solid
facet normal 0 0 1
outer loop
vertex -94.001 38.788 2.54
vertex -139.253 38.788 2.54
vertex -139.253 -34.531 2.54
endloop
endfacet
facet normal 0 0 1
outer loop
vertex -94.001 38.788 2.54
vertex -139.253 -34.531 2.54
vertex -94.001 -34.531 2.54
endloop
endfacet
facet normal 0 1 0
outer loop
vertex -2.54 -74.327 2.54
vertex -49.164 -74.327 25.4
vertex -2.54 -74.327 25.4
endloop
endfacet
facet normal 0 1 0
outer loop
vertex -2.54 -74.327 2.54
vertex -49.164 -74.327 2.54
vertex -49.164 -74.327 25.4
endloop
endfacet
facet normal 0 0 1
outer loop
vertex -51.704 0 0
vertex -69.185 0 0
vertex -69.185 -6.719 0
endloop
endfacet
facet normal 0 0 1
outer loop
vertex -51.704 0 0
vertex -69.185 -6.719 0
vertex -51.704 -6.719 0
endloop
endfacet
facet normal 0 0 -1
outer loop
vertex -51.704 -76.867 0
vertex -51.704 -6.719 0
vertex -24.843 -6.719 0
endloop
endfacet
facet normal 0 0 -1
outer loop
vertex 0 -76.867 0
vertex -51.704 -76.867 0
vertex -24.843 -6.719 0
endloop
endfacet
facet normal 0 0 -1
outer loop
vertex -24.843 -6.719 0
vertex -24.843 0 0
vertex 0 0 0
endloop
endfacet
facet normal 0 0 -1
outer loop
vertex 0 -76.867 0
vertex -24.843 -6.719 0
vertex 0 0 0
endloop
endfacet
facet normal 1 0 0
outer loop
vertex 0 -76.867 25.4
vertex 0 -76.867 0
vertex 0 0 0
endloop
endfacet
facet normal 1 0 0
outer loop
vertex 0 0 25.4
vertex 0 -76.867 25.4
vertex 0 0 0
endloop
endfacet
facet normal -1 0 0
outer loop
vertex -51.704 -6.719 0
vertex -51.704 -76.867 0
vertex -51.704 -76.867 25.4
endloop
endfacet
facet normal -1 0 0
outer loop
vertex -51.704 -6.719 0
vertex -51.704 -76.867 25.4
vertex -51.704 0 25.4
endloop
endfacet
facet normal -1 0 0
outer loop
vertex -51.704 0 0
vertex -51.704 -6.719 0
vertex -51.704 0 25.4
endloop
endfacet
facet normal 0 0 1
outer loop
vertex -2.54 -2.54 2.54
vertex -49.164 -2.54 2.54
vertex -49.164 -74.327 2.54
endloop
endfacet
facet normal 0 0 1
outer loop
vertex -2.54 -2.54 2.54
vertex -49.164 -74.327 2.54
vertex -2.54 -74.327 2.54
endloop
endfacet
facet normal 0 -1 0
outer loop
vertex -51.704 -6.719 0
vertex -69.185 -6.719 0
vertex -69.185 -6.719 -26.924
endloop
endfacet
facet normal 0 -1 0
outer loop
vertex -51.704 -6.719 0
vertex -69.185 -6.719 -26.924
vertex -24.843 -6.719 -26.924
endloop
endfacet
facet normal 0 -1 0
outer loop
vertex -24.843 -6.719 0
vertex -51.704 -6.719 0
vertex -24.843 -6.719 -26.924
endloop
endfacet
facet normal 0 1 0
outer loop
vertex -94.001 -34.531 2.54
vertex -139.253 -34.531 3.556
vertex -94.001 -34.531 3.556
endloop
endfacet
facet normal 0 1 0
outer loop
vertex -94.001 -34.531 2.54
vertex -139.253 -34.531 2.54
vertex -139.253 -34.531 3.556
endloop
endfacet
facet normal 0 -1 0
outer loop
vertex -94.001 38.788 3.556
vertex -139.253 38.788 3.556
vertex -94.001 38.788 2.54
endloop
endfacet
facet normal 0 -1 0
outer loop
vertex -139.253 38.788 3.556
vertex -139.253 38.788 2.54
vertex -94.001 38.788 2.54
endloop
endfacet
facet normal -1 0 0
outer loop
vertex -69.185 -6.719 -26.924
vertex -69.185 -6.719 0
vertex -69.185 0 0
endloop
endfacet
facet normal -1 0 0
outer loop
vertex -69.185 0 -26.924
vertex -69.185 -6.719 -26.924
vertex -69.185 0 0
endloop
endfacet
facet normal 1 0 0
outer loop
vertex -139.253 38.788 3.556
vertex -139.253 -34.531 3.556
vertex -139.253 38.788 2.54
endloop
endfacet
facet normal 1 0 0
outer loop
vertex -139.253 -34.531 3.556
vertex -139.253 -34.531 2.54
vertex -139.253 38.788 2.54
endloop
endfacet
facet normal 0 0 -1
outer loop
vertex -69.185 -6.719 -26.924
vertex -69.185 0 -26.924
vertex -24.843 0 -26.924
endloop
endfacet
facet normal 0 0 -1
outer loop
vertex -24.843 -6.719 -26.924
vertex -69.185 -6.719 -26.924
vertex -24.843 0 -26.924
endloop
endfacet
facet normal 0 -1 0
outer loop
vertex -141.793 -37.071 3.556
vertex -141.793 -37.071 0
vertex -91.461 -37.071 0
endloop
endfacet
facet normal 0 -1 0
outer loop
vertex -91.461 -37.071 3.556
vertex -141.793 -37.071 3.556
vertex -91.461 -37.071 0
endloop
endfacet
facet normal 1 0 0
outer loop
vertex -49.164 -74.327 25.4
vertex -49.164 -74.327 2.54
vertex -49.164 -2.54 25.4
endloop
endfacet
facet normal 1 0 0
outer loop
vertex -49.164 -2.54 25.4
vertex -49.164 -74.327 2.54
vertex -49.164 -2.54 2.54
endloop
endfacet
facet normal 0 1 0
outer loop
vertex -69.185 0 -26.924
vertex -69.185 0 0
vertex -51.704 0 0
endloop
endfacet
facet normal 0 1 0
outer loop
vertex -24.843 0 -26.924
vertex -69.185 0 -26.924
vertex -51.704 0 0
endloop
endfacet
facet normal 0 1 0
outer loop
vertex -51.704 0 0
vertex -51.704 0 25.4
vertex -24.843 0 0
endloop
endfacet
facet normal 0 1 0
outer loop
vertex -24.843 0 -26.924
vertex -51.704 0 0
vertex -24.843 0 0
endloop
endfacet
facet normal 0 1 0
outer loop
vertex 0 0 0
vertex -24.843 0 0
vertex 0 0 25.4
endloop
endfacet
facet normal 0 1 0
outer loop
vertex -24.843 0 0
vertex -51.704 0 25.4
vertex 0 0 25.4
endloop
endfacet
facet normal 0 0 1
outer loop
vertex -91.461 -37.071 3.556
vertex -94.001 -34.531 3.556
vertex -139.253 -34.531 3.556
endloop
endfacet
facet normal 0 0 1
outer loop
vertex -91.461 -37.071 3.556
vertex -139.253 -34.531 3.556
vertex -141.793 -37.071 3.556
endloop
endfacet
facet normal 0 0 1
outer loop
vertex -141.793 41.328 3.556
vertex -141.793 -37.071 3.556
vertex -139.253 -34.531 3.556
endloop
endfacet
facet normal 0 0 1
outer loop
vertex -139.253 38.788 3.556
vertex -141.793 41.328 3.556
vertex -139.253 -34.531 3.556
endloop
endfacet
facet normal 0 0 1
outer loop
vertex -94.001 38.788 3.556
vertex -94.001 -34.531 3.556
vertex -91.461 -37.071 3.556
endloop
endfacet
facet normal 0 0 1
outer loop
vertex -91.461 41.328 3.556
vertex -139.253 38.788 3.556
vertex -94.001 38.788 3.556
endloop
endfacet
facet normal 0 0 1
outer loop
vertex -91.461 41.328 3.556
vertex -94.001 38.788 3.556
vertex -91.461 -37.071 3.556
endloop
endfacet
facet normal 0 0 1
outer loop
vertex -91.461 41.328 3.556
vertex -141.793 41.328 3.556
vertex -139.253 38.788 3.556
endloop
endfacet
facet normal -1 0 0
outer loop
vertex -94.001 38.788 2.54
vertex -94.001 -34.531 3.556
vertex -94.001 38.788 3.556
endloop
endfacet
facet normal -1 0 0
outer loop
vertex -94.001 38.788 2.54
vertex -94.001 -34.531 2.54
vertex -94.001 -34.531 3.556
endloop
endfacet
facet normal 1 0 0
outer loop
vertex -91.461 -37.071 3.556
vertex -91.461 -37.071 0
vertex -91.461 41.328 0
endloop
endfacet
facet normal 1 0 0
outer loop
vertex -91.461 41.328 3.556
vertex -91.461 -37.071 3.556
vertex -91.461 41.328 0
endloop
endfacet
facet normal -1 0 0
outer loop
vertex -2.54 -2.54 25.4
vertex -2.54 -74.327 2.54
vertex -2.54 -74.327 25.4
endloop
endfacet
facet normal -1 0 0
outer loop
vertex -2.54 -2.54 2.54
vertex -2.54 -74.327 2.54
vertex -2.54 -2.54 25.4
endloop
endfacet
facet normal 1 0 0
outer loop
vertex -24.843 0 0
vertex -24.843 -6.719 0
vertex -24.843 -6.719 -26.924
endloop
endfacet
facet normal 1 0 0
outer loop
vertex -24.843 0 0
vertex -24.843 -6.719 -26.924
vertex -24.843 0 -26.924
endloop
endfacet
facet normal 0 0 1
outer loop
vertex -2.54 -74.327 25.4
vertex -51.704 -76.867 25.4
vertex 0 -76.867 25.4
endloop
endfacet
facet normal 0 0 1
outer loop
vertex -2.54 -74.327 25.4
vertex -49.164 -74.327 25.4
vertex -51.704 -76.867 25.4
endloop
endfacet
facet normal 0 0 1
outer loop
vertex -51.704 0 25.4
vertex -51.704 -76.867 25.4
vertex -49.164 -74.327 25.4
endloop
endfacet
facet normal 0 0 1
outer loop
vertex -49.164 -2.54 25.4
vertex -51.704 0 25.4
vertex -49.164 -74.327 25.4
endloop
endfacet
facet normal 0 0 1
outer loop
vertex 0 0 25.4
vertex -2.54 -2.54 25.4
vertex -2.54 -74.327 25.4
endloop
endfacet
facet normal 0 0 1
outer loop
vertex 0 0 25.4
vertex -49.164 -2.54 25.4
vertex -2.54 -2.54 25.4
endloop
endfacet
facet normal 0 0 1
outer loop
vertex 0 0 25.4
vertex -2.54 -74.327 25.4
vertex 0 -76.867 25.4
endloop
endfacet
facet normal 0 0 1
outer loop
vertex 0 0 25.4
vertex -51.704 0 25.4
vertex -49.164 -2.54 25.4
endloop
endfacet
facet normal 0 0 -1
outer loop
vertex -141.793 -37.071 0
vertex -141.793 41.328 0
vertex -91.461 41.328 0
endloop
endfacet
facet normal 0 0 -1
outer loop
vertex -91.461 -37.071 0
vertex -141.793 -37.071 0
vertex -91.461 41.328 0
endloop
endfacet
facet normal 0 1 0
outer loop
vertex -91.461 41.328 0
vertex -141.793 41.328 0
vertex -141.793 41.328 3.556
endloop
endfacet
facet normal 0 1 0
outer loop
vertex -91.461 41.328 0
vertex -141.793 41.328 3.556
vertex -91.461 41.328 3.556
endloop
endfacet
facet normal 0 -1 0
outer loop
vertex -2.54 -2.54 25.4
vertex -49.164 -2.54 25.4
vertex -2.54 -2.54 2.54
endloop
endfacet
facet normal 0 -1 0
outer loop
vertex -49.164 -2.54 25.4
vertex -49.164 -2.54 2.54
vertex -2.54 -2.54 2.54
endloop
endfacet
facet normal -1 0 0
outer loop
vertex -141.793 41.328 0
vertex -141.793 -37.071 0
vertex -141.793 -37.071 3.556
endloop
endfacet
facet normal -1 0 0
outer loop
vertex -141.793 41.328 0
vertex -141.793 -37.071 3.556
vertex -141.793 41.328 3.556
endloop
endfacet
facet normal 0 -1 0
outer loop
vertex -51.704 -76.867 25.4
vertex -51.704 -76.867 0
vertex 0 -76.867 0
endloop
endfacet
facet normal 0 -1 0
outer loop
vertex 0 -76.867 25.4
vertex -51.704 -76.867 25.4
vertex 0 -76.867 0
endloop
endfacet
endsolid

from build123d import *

# Parameters (mm, degrees)
F0_W     = 51.703814
F0_H     = 76.866761
F1_DEPTH = 25.4
F2_T     = -2.54
F3_W     = 50.332077
F3_H     = 78.39838
F4_DEPTH = 3.556
F5_T     = -2.54
F6_W     = 44.341865
F6_H     = 6.719023
F7_DEPTH = 26.924


with BuildPart() as f1:
    # F0 (on Top) → F1 (new body)
    with BuildSketch(Plane.XY):
        with Locations((-25.851907, -38.43338)):
            Rectangle(F0_W, F0_H)
    extrude(amount=F1_DEPTH)

    # F2
    f2_openings = [f1.faces().sort_by_distance(p)[0] for p in [
        (-25.851907, -38.43338, 25.4),
    ]]
    offset(amount=F2_T, openings=f2_openings)

    # F6 (on Top) → F7 (join)
    with BuildSketch(Plane.XY):
        with Locations((-47.014384, -3.359511)):
            Rectangle(F6_W, F6_H)
    extrude(amount=-F7_DEPTH)


with BuildPart() as f4:
    # F3 (on Top) → F4 (new body)
    with BuildSketch(Plane.XY):
        with Locations((-116.627242, 2.128402)):
            Rectangle(F3_W, F3_H)
    extrude(amount=F4_DEPTH)

    # F5
    f5_openings = [f4.faces().sort_by_distance(p)[0] for p in [
        (-116.627242, 2.128402, 3.556),
    ]]
    offset(amount=F5_T, openings=f5_openings)


solid = Compound([f1.part, f4.part])
